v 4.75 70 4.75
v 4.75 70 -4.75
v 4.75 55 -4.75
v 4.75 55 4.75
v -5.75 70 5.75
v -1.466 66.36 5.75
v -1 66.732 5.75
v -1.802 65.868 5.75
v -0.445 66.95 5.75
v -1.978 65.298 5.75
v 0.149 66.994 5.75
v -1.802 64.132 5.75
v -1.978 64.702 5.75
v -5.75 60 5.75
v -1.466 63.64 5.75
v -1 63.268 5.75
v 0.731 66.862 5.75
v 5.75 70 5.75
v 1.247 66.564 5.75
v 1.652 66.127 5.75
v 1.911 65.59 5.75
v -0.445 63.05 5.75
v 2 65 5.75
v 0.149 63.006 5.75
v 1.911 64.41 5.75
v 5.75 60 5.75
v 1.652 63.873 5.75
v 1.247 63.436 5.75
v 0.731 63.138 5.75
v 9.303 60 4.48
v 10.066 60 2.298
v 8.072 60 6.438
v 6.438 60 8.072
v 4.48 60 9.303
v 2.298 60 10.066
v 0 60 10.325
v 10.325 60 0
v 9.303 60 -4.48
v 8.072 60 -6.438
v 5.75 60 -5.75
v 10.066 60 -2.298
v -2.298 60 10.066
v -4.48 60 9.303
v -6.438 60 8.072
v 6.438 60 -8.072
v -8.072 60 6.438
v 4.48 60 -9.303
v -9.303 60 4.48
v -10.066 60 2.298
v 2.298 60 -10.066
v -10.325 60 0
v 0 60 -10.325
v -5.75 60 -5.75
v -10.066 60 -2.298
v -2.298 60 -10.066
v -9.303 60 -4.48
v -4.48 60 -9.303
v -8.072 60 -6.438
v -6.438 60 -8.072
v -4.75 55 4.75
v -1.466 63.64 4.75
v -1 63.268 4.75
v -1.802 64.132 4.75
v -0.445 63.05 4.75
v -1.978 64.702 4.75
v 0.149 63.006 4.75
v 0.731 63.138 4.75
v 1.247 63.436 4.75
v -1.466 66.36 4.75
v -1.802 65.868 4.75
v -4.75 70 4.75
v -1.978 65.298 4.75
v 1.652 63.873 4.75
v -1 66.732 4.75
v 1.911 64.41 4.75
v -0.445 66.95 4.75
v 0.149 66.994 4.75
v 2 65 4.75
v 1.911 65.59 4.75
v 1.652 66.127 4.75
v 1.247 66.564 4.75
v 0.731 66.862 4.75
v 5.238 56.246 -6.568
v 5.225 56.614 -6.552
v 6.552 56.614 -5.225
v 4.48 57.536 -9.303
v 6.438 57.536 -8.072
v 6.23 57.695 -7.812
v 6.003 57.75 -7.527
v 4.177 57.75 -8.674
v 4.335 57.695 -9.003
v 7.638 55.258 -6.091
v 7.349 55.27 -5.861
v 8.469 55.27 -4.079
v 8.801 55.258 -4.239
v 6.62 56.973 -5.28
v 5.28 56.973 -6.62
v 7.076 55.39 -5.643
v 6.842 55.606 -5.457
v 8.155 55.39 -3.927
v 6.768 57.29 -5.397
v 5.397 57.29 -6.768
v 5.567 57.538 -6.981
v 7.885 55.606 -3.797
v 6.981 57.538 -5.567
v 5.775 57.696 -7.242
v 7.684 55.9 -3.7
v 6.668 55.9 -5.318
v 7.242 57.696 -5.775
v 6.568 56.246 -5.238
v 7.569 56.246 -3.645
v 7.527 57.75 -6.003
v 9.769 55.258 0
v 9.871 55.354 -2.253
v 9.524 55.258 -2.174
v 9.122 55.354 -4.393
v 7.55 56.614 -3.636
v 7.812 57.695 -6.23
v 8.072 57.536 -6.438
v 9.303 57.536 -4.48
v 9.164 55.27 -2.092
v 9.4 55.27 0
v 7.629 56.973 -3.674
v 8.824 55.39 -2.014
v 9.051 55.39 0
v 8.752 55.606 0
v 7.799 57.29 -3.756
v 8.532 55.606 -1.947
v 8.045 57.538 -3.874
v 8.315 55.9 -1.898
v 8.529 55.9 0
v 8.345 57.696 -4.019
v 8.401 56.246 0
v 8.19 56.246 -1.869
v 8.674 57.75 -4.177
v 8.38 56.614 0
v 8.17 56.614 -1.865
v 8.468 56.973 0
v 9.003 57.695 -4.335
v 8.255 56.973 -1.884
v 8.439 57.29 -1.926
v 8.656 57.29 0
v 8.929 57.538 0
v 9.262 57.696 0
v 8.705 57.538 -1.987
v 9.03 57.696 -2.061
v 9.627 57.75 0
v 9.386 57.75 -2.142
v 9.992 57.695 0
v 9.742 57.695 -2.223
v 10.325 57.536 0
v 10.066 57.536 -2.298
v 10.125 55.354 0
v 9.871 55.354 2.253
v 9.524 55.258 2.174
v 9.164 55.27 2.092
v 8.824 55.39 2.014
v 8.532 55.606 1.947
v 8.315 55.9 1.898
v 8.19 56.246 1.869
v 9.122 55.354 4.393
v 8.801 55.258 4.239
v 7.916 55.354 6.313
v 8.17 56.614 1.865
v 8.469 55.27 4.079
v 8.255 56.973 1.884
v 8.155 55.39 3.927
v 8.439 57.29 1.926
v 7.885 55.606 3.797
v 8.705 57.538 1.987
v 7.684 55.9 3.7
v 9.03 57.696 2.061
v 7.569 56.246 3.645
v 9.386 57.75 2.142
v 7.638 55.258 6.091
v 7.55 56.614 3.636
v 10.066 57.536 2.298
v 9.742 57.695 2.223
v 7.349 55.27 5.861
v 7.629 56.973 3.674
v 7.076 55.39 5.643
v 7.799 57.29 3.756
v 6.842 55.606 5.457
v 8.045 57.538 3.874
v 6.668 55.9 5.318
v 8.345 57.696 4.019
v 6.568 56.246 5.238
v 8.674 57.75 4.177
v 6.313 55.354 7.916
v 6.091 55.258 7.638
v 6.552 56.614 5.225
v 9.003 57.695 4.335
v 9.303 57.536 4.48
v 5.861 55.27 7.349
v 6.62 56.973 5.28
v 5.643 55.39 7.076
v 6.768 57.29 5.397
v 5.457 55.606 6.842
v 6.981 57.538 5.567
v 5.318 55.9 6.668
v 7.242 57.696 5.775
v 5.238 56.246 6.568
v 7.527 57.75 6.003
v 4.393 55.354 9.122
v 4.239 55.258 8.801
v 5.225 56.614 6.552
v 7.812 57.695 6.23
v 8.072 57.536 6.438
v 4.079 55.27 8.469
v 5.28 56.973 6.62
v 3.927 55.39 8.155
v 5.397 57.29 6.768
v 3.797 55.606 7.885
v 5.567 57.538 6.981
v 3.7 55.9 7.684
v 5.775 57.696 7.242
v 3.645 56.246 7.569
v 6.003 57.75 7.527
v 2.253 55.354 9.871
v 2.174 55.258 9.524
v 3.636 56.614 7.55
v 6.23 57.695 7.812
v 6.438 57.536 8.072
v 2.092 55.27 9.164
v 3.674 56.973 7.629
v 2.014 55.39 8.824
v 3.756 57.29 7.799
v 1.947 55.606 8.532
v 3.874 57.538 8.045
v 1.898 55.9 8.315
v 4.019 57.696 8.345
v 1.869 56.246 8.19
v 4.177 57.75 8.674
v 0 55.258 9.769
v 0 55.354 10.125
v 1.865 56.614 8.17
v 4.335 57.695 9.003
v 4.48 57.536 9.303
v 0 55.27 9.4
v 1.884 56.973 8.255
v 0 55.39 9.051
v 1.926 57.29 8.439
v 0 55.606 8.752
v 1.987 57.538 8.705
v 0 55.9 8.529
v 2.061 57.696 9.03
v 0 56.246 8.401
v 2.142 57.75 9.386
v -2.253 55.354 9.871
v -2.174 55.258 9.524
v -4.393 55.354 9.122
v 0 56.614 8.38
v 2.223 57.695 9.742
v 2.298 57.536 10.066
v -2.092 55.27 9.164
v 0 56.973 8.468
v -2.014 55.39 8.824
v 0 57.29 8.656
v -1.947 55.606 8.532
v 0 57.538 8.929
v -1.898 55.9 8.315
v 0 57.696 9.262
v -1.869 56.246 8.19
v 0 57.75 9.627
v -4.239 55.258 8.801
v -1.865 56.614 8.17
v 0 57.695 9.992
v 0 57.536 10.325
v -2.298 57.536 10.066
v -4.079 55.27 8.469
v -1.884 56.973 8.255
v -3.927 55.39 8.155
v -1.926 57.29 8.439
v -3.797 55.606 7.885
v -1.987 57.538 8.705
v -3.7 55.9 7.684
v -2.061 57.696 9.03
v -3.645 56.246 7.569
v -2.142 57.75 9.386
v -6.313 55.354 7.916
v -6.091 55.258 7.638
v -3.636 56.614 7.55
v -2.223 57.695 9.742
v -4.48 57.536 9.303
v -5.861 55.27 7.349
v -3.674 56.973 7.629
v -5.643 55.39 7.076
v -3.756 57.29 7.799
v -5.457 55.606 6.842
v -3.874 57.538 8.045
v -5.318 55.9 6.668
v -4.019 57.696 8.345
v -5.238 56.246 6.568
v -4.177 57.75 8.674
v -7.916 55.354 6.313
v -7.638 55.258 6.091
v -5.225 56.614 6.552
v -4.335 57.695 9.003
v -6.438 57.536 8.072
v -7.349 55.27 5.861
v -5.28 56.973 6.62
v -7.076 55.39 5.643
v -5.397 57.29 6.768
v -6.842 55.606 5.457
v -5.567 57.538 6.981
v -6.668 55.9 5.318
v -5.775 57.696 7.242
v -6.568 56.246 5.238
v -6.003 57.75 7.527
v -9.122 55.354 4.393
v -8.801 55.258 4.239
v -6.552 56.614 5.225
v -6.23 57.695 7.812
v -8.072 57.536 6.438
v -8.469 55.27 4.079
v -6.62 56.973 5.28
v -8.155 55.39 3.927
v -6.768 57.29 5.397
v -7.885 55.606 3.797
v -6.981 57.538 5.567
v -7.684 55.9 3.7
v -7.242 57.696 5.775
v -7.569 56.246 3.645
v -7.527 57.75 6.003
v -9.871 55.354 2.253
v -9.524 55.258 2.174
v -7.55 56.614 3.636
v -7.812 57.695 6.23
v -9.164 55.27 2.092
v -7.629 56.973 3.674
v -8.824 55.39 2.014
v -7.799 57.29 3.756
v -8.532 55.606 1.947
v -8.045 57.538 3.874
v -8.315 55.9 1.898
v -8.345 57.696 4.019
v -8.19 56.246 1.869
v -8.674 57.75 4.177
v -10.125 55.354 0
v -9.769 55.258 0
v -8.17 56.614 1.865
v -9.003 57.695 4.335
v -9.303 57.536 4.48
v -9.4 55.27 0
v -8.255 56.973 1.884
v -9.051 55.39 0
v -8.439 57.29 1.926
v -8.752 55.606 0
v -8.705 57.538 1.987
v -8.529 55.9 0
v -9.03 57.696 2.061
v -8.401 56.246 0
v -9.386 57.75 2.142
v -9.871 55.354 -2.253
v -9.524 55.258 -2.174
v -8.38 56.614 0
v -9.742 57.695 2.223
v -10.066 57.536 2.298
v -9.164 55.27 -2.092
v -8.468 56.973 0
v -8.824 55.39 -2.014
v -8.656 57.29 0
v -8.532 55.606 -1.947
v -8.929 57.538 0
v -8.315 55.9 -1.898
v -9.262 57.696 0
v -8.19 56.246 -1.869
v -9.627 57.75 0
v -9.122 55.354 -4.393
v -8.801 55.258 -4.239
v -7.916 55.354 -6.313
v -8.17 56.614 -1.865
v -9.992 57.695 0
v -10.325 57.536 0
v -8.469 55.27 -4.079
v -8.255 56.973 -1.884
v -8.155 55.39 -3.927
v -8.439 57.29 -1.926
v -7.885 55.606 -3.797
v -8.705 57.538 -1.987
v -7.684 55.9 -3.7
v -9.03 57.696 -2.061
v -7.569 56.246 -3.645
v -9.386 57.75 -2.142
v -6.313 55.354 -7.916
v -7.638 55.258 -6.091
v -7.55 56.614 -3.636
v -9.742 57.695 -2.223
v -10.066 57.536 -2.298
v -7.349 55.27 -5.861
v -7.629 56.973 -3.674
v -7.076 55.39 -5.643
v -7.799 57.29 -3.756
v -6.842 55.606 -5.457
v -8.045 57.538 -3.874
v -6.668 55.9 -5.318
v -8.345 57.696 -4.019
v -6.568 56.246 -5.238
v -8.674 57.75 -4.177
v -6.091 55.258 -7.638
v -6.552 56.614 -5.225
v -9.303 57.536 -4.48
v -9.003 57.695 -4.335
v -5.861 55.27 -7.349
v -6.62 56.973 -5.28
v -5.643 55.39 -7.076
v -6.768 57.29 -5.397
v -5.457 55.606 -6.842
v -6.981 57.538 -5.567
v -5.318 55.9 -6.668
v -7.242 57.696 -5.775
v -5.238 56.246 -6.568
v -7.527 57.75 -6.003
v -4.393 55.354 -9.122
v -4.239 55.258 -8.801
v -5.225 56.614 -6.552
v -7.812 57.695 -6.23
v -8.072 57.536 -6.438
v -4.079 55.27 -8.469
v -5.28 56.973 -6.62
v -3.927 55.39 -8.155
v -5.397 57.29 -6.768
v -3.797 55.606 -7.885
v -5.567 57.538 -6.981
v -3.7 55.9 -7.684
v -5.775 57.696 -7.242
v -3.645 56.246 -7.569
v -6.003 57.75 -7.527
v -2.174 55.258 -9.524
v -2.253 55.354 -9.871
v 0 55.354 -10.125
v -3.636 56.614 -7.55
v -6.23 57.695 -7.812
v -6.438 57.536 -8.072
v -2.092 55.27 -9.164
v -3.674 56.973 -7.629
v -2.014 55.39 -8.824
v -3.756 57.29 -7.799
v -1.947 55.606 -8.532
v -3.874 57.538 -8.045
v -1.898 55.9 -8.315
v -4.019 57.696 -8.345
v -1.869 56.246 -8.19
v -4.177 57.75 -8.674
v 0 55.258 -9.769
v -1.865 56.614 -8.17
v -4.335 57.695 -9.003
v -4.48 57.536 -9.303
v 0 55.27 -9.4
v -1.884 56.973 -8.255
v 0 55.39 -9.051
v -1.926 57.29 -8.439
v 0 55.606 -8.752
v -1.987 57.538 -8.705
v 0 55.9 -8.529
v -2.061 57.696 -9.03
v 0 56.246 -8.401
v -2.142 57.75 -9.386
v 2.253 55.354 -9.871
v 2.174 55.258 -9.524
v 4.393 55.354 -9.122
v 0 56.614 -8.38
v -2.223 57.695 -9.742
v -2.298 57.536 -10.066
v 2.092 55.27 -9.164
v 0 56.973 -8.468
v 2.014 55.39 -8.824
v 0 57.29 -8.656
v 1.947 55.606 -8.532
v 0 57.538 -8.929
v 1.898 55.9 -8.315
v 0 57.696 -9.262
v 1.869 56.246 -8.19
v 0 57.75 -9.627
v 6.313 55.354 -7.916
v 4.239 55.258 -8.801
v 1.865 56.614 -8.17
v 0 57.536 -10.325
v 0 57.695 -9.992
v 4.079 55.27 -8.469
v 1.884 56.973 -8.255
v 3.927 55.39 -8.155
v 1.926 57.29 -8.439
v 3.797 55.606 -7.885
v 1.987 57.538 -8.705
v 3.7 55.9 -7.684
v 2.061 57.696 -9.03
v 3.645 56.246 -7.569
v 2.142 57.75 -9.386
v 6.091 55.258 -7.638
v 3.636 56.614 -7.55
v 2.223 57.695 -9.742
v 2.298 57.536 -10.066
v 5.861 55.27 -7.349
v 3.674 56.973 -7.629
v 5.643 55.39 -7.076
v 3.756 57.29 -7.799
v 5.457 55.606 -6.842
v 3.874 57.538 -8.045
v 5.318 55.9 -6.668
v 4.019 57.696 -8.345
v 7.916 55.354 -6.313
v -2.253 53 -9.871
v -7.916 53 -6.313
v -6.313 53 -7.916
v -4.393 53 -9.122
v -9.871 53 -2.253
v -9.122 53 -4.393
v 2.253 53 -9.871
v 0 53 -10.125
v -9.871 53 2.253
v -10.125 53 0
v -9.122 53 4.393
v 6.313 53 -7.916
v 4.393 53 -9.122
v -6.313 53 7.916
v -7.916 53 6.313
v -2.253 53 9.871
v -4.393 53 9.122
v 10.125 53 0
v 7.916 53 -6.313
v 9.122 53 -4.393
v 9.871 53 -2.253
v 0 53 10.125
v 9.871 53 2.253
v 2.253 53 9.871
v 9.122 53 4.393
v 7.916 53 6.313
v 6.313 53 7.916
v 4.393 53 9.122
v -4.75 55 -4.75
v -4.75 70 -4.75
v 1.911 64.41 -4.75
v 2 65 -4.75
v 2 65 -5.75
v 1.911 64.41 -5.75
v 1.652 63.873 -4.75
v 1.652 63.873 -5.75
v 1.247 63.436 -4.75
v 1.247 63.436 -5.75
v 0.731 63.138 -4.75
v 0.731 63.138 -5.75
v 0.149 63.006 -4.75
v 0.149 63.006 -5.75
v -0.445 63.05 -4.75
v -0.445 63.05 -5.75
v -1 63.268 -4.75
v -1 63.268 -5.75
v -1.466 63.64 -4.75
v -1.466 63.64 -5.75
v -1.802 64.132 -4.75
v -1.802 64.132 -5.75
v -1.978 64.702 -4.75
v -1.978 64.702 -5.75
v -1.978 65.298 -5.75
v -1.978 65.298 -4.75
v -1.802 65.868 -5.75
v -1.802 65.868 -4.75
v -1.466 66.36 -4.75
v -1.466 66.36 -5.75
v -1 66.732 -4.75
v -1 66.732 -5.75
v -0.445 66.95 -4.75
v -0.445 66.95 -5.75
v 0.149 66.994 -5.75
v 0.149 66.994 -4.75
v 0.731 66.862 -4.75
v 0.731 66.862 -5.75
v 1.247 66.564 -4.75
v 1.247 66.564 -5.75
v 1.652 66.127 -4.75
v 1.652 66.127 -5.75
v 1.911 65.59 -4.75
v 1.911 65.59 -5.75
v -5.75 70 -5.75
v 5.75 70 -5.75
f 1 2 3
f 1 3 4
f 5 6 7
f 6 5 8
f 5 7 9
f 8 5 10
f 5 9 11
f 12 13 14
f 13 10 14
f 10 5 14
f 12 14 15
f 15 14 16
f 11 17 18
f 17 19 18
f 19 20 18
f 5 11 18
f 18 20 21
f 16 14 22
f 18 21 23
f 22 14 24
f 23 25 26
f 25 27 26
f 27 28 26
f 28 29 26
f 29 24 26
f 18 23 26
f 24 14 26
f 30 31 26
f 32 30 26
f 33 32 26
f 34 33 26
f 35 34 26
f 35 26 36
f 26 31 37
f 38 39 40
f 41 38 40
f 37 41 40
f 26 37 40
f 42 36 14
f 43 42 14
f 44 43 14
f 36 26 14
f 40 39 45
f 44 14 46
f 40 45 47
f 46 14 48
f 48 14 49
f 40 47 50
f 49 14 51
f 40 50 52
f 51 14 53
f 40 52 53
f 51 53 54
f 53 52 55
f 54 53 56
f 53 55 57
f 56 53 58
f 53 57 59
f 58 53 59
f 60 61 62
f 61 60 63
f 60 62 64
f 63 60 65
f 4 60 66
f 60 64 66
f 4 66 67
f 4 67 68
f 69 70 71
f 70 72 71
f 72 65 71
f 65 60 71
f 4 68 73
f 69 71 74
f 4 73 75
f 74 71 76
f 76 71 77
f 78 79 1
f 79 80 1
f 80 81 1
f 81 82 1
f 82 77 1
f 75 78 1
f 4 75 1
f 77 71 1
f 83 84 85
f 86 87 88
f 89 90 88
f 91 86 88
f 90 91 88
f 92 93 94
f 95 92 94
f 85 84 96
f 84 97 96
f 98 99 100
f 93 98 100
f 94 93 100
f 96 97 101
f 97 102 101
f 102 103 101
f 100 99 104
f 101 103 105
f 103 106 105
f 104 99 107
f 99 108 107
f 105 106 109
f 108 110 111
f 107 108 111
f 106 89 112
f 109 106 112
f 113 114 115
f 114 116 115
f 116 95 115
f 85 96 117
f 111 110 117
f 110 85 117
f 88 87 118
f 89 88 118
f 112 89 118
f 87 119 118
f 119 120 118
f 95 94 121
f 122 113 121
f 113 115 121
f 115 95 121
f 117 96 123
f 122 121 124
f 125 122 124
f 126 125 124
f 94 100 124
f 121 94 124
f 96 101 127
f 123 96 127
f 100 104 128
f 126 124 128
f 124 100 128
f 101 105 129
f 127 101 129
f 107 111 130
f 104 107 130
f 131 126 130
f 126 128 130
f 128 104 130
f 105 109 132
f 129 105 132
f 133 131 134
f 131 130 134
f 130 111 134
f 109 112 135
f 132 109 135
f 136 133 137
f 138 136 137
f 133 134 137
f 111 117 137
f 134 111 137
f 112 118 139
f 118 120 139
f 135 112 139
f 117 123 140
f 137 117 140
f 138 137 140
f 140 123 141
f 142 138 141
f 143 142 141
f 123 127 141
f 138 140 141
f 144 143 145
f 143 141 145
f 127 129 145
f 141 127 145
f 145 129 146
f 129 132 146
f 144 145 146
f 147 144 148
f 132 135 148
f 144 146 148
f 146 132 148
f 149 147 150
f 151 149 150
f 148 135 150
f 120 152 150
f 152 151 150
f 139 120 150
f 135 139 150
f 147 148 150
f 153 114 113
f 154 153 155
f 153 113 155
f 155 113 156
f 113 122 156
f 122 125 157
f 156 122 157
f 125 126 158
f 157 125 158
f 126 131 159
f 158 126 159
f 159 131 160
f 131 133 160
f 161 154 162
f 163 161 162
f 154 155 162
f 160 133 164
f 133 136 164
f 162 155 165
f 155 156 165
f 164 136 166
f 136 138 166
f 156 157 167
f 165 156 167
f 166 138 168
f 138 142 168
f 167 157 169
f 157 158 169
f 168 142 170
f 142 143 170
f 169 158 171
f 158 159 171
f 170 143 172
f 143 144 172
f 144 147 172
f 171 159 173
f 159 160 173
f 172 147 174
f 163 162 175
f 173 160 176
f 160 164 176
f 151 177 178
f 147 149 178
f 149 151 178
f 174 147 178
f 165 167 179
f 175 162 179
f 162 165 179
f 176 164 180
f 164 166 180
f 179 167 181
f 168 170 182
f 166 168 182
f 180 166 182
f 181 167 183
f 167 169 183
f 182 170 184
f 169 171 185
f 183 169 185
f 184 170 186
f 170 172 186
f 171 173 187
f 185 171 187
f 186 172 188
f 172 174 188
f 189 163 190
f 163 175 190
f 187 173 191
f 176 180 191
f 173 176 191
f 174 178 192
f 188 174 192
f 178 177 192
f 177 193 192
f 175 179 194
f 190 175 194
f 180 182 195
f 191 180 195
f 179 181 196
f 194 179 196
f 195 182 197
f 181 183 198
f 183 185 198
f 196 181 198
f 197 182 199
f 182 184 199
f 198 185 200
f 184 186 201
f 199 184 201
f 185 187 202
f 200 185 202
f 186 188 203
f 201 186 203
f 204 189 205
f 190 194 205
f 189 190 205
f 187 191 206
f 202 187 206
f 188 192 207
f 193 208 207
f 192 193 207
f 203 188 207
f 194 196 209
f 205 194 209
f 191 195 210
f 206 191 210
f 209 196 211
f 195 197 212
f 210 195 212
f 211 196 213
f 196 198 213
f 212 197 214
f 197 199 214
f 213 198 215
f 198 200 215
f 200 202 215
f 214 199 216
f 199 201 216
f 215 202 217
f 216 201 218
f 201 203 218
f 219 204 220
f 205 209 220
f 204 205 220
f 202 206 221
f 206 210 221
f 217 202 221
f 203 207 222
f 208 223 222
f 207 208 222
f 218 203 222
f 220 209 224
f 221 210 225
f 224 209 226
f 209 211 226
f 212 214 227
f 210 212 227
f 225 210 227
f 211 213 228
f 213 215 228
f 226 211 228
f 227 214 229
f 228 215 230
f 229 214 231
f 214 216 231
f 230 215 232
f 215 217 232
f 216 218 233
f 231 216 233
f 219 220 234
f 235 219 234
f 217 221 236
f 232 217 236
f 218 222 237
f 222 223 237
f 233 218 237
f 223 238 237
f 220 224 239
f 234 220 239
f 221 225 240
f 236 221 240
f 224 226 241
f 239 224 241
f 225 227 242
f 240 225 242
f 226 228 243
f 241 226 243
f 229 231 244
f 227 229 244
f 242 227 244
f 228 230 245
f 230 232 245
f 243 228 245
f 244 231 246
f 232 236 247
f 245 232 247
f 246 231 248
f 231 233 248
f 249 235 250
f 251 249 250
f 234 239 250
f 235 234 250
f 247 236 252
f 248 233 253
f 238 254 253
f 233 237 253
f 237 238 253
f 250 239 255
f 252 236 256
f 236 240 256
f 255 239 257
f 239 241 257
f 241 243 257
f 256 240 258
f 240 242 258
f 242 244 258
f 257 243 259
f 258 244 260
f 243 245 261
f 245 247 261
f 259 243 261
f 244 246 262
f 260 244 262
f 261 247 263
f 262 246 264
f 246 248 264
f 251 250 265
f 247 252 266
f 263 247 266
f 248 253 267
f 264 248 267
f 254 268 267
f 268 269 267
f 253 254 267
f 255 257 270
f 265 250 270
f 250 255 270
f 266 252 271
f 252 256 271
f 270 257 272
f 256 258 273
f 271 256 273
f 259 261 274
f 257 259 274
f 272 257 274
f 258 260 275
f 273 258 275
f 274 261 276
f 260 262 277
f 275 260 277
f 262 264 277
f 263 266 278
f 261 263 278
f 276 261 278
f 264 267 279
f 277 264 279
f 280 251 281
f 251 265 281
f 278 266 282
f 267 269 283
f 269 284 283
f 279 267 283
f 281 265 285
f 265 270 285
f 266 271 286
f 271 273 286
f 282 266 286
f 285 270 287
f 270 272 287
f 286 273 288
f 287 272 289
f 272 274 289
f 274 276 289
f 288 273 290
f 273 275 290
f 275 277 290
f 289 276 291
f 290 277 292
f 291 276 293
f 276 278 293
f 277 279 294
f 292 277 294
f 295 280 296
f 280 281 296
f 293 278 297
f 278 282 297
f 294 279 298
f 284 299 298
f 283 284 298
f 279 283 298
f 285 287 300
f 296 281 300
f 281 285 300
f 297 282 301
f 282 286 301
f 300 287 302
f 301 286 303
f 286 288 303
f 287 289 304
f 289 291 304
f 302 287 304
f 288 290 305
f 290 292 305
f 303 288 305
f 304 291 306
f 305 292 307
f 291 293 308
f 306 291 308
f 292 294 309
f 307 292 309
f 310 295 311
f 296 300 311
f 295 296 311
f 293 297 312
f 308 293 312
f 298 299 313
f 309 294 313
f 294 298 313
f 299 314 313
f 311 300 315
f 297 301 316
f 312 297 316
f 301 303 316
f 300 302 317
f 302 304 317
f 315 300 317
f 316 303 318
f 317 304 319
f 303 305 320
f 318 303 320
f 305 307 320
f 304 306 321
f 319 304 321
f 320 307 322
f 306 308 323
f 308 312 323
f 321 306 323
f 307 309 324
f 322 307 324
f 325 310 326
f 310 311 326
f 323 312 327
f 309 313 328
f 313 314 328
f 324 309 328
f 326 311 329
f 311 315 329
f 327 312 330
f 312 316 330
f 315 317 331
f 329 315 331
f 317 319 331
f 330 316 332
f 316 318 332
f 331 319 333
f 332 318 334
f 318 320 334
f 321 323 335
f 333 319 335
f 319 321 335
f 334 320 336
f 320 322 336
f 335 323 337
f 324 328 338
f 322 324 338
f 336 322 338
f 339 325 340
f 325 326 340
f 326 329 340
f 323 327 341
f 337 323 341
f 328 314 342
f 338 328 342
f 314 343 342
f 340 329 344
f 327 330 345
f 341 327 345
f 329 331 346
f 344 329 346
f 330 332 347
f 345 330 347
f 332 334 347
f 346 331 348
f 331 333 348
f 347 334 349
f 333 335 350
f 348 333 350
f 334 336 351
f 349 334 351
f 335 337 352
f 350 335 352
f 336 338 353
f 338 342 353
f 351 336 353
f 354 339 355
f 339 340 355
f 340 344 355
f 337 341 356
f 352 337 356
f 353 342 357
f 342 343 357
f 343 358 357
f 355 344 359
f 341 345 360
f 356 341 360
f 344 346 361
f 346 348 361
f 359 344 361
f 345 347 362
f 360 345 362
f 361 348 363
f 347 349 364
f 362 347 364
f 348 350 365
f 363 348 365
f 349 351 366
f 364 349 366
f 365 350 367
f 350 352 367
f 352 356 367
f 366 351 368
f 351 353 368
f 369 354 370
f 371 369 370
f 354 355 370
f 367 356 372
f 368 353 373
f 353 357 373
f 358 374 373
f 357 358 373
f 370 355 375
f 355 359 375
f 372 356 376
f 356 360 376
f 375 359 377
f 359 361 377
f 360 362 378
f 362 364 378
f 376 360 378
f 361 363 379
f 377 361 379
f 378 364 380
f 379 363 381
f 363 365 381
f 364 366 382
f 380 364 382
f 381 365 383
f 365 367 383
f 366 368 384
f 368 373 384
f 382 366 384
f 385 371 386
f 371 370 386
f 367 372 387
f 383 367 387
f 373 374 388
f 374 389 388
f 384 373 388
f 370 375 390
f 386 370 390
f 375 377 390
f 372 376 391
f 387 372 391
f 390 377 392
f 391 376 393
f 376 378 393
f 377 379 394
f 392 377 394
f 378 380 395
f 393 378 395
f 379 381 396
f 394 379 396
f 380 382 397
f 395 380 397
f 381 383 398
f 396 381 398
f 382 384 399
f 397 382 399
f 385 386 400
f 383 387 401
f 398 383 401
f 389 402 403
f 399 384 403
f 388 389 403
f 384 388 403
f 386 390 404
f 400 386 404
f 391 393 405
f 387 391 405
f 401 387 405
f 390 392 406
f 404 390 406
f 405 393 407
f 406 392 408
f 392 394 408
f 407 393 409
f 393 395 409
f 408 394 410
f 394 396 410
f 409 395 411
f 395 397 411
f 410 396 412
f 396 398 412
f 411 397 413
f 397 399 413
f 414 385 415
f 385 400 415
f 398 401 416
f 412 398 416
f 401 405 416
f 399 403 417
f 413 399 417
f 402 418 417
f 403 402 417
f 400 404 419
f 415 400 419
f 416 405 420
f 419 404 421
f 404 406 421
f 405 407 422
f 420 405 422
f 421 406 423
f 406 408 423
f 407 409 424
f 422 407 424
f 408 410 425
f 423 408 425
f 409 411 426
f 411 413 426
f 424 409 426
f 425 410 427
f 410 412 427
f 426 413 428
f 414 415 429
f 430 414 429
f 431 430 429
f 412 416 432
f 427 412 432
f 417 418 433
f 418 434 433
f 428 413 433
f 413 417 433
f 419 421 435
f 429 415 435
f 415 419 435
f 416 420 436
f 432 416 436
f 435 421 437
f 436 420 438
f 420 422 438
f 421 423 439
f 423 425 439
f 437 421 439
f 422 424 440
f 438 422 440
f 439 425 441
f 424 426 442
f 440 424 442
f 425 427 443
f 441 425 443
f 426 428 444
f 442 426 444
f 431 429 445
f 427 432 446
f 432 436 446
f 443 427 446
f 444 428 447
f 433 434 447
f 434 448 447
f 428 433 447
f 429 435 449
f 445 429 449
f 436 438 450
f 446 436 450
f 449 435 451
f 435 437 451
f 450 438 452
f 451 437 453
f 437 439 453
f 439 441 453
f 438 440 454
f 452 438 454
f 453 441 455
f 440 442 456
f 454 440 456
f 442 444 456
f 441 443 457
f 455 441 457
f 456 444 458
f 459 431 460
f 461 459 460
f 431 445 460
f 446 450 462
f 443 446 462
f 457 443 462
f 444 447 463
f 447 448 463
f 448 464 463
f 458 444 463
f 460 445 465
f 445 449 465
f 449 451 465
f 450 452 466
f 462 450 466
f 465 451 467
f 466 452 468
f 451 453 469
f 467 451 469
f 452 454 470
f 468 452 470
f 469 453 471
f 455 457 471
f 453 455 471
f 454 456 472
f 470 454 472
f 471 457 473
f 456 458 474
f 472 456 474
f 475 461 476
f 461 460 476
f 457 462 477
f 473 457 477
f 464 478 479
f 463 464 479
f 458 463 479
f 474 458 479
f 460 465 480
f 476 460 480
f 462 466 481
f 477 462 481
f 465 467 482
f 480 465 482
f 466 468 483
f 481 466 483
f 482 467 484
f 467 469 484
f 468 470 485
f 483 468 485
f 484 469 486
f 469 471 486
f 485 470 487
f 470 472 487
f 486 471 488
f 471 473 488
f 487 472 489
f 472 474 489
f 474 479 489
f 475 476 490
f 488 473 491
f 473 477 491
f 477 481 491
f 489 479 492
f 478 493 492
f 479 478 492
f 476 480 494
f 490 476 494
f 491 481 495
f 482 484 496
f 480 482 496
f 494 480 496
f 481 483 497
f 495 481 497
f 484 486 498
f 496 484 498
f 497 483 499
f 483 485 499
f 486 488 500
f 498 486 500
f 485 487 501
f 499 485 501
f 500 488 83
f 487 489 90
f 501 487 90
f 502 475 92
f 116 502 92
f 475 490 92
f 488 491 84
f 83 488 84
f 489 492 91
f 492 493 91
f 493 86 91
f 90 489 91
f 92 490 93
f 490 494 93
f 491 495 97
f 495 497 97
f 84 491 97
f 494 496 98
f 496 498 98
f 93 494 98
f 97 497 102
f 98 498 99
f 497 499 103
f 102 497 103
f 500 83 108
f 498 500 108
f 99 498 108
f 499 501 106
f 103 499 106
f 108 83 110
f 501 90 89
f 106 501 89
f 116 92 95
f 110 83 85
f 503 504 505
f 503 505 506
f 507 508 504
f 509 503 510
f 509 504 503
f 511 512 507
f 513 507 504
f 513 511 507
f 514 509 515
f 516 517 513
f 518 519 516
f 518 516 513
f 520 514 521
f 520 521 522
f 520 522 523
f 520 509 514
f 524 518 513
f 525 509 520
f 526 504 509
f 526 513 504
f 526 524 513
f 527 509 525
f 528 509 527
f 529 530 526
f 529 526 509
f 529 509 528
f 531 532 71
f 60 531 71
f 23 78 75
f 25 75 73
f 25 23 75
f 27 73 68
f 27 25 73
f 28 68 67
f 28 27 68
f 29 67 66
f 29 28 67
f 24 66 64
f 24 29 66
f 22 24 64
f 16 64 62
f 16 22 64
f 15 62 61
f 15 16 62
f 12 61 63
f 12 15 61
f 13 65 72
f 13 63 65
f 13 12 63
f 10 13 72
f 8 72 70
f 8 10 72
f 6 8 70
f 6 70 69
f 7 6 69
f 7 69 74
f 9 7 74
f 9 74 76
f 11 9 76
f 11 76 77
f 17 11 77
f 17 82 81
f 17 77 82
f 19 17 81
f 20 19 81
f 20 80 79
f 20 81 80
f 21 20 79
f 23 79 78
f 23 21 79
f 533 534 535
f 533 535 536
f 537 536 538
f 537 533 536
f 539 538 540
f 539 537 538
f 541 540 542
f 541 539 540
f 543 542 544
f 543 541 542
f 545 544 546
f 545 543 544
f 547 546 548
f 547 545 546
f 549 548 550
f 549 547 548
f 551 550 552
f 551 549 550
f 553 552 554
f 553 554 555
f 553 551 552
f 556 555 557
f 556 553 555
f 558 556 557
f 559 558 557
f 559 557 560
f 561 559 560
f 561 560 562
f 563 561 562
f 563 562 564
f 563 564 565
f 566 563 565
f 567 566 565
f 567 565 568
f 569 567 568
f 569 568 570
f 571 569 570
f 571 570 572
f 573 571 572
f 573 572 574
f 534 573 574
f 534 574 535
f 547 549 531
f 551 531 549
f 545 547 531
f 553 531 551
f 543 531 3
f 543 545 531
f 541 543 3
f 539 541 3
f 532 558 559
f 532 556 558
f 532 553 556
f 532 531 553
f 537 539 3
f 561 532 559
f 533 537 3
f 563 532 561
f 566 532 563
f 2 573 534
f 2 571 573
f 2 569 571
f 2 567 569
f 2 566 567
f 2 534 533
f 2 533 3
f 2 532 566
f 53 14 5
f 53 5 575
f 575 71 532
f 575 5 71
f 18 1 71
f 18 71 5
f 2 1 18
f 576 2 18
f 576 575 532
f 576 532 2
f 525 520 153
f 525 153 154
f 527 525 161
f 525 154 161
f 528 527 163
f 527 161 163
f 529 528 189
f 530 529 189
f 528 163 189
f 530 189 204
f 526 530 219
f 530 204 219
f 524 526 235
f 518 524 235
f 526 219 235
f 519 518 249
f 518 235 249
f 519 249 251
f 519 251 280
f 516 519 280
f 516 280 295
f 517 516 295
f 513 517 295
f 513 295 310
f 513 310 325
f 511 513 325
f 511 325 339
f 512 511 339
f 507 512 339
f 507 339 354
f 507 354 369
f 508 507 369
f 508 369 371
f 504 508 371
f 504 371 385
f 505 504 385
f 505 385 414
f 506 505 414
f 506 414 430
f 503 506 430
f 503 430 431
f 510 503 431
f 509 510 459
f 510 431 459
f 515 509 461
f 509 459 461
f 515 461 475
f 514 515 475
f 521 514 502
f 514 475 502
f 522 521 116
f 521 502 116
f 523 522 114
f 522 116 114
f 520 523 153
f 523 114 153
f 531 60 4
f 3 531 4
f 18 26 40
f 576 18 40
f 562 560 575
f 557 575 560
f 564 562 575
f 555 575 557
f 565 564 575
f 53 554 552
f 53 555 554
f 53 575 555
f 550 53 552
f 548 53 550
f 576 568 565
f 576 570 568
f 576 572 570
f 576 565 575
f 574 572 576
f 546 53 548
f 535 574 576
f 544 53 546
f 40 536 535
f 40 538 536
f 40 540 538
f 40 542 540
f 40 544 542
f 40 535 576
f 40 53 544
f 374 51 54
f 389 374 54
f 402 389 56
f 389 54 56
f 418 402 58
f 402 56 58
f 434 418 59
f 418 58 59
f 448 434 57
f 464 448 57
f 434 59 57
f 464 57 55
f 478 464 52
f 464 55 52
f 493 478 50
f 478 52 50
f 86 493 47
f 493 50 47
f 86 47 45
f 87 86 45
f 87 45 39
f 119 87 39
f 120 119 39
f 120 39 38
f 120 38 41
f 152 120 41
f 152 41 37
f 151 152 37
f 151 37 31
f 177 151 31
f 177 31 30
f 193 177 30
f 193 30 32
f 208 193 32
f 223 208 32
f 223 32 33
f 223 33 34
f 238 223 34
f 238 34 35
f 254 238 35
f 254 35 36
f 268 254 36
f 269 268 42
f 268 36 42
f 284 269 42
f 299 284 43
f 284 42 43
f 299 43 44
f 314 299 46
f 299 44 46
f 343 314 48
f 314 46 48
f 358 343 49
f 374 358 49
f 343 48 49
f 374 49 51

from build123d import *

# Parameters (mm, degrees)
CYLINDER019_R     = 10.125
CYLINDER019_DEPTH = 7
BOX016_W          = 11.5
BOX016_H          = 11.5
BOX016_DEPTH      = 10
CYLINDER023_R     = 10.325
CYLINDER023_DEPTH = 2.5
BOX017_W          = 9.5
BOX017_H          = 9.5
BOX017_DEPTH      = 15
CYLINDER020_R     = 2
CYLINDER020_DEPTH = 11.5
TORUS_R           = 1.25


with BuildPart() as part:
    # Cylinder019 → Cylinder019 (join)
    with BuildSketch(Plane.XZ):
        Circle(CYLINDER019_R)
    extrude(amount=CYLINDER019_DEPTH)

    # Box016 → Box016 (join)
    with BuildSketch(Plane(origin=(-5.75, 0, 5.75), x_dir=(1, 0, 0), z_dir=(0, 1, 0))):
        with Locations((5.75, 5.75)):
            Rectangle(BOX016_W, BOX016_H)
    extrude(amount=BOX016_DEPTH)

    # Cylinder023 → Cylinder023 (join)
    with BuildSketch(Plane(origin=(0, 0, 0), x_dir=(-1, 0, 0), z_dir=(0, -1, 0))):
        Circle(CYLINDER023_R)
    extrude(amount=CYLINDER023_DEPTH)

    # Box017 → Box017 (cut)
    with BuildSketch(Plane(origin=(-4.75, 10, -4.75), x_dir=(1, 0, 0), z_dir=(0, -1, 0))):
        with Locations((4.75, 4.75)):
            Rectangle(BOX017_W, BOX017_H)
    extrude(amount=BOX017_DEPTH, mode=Mode.SUBTRACT)

    # Cylinder020 → Cylinder020 (cut)
    with BuildSketch(Plane(origin=(0, 5, 5.75), x_dir=(1, 0, 0), z_dir=(0, 0, -1))):
        Circle(CYLINDER020_R)
    extrude(amount=CYLINDER020_DEPTH, mode=Mode.SUBTRACT)

    # Torus → Torus (revolve, cut)
    with BuildSketch(Plane(origin=(0, -3.5, 0), x_dir=(1, 0, 0), z_dir=(0, 0, -1))):
        with Locations((9.625, 0)):
            Circle(TORUS_R)
    revolve(axis=Axis((0, -3.5, 0), (0, -1, 0)), mode=Mode.SUBTRACT)


with BuildPart() as part_1:
    # Body004 placement: moved
    add(part.part.moved(Location((0, 60, 0))))


solid = part_1.part
